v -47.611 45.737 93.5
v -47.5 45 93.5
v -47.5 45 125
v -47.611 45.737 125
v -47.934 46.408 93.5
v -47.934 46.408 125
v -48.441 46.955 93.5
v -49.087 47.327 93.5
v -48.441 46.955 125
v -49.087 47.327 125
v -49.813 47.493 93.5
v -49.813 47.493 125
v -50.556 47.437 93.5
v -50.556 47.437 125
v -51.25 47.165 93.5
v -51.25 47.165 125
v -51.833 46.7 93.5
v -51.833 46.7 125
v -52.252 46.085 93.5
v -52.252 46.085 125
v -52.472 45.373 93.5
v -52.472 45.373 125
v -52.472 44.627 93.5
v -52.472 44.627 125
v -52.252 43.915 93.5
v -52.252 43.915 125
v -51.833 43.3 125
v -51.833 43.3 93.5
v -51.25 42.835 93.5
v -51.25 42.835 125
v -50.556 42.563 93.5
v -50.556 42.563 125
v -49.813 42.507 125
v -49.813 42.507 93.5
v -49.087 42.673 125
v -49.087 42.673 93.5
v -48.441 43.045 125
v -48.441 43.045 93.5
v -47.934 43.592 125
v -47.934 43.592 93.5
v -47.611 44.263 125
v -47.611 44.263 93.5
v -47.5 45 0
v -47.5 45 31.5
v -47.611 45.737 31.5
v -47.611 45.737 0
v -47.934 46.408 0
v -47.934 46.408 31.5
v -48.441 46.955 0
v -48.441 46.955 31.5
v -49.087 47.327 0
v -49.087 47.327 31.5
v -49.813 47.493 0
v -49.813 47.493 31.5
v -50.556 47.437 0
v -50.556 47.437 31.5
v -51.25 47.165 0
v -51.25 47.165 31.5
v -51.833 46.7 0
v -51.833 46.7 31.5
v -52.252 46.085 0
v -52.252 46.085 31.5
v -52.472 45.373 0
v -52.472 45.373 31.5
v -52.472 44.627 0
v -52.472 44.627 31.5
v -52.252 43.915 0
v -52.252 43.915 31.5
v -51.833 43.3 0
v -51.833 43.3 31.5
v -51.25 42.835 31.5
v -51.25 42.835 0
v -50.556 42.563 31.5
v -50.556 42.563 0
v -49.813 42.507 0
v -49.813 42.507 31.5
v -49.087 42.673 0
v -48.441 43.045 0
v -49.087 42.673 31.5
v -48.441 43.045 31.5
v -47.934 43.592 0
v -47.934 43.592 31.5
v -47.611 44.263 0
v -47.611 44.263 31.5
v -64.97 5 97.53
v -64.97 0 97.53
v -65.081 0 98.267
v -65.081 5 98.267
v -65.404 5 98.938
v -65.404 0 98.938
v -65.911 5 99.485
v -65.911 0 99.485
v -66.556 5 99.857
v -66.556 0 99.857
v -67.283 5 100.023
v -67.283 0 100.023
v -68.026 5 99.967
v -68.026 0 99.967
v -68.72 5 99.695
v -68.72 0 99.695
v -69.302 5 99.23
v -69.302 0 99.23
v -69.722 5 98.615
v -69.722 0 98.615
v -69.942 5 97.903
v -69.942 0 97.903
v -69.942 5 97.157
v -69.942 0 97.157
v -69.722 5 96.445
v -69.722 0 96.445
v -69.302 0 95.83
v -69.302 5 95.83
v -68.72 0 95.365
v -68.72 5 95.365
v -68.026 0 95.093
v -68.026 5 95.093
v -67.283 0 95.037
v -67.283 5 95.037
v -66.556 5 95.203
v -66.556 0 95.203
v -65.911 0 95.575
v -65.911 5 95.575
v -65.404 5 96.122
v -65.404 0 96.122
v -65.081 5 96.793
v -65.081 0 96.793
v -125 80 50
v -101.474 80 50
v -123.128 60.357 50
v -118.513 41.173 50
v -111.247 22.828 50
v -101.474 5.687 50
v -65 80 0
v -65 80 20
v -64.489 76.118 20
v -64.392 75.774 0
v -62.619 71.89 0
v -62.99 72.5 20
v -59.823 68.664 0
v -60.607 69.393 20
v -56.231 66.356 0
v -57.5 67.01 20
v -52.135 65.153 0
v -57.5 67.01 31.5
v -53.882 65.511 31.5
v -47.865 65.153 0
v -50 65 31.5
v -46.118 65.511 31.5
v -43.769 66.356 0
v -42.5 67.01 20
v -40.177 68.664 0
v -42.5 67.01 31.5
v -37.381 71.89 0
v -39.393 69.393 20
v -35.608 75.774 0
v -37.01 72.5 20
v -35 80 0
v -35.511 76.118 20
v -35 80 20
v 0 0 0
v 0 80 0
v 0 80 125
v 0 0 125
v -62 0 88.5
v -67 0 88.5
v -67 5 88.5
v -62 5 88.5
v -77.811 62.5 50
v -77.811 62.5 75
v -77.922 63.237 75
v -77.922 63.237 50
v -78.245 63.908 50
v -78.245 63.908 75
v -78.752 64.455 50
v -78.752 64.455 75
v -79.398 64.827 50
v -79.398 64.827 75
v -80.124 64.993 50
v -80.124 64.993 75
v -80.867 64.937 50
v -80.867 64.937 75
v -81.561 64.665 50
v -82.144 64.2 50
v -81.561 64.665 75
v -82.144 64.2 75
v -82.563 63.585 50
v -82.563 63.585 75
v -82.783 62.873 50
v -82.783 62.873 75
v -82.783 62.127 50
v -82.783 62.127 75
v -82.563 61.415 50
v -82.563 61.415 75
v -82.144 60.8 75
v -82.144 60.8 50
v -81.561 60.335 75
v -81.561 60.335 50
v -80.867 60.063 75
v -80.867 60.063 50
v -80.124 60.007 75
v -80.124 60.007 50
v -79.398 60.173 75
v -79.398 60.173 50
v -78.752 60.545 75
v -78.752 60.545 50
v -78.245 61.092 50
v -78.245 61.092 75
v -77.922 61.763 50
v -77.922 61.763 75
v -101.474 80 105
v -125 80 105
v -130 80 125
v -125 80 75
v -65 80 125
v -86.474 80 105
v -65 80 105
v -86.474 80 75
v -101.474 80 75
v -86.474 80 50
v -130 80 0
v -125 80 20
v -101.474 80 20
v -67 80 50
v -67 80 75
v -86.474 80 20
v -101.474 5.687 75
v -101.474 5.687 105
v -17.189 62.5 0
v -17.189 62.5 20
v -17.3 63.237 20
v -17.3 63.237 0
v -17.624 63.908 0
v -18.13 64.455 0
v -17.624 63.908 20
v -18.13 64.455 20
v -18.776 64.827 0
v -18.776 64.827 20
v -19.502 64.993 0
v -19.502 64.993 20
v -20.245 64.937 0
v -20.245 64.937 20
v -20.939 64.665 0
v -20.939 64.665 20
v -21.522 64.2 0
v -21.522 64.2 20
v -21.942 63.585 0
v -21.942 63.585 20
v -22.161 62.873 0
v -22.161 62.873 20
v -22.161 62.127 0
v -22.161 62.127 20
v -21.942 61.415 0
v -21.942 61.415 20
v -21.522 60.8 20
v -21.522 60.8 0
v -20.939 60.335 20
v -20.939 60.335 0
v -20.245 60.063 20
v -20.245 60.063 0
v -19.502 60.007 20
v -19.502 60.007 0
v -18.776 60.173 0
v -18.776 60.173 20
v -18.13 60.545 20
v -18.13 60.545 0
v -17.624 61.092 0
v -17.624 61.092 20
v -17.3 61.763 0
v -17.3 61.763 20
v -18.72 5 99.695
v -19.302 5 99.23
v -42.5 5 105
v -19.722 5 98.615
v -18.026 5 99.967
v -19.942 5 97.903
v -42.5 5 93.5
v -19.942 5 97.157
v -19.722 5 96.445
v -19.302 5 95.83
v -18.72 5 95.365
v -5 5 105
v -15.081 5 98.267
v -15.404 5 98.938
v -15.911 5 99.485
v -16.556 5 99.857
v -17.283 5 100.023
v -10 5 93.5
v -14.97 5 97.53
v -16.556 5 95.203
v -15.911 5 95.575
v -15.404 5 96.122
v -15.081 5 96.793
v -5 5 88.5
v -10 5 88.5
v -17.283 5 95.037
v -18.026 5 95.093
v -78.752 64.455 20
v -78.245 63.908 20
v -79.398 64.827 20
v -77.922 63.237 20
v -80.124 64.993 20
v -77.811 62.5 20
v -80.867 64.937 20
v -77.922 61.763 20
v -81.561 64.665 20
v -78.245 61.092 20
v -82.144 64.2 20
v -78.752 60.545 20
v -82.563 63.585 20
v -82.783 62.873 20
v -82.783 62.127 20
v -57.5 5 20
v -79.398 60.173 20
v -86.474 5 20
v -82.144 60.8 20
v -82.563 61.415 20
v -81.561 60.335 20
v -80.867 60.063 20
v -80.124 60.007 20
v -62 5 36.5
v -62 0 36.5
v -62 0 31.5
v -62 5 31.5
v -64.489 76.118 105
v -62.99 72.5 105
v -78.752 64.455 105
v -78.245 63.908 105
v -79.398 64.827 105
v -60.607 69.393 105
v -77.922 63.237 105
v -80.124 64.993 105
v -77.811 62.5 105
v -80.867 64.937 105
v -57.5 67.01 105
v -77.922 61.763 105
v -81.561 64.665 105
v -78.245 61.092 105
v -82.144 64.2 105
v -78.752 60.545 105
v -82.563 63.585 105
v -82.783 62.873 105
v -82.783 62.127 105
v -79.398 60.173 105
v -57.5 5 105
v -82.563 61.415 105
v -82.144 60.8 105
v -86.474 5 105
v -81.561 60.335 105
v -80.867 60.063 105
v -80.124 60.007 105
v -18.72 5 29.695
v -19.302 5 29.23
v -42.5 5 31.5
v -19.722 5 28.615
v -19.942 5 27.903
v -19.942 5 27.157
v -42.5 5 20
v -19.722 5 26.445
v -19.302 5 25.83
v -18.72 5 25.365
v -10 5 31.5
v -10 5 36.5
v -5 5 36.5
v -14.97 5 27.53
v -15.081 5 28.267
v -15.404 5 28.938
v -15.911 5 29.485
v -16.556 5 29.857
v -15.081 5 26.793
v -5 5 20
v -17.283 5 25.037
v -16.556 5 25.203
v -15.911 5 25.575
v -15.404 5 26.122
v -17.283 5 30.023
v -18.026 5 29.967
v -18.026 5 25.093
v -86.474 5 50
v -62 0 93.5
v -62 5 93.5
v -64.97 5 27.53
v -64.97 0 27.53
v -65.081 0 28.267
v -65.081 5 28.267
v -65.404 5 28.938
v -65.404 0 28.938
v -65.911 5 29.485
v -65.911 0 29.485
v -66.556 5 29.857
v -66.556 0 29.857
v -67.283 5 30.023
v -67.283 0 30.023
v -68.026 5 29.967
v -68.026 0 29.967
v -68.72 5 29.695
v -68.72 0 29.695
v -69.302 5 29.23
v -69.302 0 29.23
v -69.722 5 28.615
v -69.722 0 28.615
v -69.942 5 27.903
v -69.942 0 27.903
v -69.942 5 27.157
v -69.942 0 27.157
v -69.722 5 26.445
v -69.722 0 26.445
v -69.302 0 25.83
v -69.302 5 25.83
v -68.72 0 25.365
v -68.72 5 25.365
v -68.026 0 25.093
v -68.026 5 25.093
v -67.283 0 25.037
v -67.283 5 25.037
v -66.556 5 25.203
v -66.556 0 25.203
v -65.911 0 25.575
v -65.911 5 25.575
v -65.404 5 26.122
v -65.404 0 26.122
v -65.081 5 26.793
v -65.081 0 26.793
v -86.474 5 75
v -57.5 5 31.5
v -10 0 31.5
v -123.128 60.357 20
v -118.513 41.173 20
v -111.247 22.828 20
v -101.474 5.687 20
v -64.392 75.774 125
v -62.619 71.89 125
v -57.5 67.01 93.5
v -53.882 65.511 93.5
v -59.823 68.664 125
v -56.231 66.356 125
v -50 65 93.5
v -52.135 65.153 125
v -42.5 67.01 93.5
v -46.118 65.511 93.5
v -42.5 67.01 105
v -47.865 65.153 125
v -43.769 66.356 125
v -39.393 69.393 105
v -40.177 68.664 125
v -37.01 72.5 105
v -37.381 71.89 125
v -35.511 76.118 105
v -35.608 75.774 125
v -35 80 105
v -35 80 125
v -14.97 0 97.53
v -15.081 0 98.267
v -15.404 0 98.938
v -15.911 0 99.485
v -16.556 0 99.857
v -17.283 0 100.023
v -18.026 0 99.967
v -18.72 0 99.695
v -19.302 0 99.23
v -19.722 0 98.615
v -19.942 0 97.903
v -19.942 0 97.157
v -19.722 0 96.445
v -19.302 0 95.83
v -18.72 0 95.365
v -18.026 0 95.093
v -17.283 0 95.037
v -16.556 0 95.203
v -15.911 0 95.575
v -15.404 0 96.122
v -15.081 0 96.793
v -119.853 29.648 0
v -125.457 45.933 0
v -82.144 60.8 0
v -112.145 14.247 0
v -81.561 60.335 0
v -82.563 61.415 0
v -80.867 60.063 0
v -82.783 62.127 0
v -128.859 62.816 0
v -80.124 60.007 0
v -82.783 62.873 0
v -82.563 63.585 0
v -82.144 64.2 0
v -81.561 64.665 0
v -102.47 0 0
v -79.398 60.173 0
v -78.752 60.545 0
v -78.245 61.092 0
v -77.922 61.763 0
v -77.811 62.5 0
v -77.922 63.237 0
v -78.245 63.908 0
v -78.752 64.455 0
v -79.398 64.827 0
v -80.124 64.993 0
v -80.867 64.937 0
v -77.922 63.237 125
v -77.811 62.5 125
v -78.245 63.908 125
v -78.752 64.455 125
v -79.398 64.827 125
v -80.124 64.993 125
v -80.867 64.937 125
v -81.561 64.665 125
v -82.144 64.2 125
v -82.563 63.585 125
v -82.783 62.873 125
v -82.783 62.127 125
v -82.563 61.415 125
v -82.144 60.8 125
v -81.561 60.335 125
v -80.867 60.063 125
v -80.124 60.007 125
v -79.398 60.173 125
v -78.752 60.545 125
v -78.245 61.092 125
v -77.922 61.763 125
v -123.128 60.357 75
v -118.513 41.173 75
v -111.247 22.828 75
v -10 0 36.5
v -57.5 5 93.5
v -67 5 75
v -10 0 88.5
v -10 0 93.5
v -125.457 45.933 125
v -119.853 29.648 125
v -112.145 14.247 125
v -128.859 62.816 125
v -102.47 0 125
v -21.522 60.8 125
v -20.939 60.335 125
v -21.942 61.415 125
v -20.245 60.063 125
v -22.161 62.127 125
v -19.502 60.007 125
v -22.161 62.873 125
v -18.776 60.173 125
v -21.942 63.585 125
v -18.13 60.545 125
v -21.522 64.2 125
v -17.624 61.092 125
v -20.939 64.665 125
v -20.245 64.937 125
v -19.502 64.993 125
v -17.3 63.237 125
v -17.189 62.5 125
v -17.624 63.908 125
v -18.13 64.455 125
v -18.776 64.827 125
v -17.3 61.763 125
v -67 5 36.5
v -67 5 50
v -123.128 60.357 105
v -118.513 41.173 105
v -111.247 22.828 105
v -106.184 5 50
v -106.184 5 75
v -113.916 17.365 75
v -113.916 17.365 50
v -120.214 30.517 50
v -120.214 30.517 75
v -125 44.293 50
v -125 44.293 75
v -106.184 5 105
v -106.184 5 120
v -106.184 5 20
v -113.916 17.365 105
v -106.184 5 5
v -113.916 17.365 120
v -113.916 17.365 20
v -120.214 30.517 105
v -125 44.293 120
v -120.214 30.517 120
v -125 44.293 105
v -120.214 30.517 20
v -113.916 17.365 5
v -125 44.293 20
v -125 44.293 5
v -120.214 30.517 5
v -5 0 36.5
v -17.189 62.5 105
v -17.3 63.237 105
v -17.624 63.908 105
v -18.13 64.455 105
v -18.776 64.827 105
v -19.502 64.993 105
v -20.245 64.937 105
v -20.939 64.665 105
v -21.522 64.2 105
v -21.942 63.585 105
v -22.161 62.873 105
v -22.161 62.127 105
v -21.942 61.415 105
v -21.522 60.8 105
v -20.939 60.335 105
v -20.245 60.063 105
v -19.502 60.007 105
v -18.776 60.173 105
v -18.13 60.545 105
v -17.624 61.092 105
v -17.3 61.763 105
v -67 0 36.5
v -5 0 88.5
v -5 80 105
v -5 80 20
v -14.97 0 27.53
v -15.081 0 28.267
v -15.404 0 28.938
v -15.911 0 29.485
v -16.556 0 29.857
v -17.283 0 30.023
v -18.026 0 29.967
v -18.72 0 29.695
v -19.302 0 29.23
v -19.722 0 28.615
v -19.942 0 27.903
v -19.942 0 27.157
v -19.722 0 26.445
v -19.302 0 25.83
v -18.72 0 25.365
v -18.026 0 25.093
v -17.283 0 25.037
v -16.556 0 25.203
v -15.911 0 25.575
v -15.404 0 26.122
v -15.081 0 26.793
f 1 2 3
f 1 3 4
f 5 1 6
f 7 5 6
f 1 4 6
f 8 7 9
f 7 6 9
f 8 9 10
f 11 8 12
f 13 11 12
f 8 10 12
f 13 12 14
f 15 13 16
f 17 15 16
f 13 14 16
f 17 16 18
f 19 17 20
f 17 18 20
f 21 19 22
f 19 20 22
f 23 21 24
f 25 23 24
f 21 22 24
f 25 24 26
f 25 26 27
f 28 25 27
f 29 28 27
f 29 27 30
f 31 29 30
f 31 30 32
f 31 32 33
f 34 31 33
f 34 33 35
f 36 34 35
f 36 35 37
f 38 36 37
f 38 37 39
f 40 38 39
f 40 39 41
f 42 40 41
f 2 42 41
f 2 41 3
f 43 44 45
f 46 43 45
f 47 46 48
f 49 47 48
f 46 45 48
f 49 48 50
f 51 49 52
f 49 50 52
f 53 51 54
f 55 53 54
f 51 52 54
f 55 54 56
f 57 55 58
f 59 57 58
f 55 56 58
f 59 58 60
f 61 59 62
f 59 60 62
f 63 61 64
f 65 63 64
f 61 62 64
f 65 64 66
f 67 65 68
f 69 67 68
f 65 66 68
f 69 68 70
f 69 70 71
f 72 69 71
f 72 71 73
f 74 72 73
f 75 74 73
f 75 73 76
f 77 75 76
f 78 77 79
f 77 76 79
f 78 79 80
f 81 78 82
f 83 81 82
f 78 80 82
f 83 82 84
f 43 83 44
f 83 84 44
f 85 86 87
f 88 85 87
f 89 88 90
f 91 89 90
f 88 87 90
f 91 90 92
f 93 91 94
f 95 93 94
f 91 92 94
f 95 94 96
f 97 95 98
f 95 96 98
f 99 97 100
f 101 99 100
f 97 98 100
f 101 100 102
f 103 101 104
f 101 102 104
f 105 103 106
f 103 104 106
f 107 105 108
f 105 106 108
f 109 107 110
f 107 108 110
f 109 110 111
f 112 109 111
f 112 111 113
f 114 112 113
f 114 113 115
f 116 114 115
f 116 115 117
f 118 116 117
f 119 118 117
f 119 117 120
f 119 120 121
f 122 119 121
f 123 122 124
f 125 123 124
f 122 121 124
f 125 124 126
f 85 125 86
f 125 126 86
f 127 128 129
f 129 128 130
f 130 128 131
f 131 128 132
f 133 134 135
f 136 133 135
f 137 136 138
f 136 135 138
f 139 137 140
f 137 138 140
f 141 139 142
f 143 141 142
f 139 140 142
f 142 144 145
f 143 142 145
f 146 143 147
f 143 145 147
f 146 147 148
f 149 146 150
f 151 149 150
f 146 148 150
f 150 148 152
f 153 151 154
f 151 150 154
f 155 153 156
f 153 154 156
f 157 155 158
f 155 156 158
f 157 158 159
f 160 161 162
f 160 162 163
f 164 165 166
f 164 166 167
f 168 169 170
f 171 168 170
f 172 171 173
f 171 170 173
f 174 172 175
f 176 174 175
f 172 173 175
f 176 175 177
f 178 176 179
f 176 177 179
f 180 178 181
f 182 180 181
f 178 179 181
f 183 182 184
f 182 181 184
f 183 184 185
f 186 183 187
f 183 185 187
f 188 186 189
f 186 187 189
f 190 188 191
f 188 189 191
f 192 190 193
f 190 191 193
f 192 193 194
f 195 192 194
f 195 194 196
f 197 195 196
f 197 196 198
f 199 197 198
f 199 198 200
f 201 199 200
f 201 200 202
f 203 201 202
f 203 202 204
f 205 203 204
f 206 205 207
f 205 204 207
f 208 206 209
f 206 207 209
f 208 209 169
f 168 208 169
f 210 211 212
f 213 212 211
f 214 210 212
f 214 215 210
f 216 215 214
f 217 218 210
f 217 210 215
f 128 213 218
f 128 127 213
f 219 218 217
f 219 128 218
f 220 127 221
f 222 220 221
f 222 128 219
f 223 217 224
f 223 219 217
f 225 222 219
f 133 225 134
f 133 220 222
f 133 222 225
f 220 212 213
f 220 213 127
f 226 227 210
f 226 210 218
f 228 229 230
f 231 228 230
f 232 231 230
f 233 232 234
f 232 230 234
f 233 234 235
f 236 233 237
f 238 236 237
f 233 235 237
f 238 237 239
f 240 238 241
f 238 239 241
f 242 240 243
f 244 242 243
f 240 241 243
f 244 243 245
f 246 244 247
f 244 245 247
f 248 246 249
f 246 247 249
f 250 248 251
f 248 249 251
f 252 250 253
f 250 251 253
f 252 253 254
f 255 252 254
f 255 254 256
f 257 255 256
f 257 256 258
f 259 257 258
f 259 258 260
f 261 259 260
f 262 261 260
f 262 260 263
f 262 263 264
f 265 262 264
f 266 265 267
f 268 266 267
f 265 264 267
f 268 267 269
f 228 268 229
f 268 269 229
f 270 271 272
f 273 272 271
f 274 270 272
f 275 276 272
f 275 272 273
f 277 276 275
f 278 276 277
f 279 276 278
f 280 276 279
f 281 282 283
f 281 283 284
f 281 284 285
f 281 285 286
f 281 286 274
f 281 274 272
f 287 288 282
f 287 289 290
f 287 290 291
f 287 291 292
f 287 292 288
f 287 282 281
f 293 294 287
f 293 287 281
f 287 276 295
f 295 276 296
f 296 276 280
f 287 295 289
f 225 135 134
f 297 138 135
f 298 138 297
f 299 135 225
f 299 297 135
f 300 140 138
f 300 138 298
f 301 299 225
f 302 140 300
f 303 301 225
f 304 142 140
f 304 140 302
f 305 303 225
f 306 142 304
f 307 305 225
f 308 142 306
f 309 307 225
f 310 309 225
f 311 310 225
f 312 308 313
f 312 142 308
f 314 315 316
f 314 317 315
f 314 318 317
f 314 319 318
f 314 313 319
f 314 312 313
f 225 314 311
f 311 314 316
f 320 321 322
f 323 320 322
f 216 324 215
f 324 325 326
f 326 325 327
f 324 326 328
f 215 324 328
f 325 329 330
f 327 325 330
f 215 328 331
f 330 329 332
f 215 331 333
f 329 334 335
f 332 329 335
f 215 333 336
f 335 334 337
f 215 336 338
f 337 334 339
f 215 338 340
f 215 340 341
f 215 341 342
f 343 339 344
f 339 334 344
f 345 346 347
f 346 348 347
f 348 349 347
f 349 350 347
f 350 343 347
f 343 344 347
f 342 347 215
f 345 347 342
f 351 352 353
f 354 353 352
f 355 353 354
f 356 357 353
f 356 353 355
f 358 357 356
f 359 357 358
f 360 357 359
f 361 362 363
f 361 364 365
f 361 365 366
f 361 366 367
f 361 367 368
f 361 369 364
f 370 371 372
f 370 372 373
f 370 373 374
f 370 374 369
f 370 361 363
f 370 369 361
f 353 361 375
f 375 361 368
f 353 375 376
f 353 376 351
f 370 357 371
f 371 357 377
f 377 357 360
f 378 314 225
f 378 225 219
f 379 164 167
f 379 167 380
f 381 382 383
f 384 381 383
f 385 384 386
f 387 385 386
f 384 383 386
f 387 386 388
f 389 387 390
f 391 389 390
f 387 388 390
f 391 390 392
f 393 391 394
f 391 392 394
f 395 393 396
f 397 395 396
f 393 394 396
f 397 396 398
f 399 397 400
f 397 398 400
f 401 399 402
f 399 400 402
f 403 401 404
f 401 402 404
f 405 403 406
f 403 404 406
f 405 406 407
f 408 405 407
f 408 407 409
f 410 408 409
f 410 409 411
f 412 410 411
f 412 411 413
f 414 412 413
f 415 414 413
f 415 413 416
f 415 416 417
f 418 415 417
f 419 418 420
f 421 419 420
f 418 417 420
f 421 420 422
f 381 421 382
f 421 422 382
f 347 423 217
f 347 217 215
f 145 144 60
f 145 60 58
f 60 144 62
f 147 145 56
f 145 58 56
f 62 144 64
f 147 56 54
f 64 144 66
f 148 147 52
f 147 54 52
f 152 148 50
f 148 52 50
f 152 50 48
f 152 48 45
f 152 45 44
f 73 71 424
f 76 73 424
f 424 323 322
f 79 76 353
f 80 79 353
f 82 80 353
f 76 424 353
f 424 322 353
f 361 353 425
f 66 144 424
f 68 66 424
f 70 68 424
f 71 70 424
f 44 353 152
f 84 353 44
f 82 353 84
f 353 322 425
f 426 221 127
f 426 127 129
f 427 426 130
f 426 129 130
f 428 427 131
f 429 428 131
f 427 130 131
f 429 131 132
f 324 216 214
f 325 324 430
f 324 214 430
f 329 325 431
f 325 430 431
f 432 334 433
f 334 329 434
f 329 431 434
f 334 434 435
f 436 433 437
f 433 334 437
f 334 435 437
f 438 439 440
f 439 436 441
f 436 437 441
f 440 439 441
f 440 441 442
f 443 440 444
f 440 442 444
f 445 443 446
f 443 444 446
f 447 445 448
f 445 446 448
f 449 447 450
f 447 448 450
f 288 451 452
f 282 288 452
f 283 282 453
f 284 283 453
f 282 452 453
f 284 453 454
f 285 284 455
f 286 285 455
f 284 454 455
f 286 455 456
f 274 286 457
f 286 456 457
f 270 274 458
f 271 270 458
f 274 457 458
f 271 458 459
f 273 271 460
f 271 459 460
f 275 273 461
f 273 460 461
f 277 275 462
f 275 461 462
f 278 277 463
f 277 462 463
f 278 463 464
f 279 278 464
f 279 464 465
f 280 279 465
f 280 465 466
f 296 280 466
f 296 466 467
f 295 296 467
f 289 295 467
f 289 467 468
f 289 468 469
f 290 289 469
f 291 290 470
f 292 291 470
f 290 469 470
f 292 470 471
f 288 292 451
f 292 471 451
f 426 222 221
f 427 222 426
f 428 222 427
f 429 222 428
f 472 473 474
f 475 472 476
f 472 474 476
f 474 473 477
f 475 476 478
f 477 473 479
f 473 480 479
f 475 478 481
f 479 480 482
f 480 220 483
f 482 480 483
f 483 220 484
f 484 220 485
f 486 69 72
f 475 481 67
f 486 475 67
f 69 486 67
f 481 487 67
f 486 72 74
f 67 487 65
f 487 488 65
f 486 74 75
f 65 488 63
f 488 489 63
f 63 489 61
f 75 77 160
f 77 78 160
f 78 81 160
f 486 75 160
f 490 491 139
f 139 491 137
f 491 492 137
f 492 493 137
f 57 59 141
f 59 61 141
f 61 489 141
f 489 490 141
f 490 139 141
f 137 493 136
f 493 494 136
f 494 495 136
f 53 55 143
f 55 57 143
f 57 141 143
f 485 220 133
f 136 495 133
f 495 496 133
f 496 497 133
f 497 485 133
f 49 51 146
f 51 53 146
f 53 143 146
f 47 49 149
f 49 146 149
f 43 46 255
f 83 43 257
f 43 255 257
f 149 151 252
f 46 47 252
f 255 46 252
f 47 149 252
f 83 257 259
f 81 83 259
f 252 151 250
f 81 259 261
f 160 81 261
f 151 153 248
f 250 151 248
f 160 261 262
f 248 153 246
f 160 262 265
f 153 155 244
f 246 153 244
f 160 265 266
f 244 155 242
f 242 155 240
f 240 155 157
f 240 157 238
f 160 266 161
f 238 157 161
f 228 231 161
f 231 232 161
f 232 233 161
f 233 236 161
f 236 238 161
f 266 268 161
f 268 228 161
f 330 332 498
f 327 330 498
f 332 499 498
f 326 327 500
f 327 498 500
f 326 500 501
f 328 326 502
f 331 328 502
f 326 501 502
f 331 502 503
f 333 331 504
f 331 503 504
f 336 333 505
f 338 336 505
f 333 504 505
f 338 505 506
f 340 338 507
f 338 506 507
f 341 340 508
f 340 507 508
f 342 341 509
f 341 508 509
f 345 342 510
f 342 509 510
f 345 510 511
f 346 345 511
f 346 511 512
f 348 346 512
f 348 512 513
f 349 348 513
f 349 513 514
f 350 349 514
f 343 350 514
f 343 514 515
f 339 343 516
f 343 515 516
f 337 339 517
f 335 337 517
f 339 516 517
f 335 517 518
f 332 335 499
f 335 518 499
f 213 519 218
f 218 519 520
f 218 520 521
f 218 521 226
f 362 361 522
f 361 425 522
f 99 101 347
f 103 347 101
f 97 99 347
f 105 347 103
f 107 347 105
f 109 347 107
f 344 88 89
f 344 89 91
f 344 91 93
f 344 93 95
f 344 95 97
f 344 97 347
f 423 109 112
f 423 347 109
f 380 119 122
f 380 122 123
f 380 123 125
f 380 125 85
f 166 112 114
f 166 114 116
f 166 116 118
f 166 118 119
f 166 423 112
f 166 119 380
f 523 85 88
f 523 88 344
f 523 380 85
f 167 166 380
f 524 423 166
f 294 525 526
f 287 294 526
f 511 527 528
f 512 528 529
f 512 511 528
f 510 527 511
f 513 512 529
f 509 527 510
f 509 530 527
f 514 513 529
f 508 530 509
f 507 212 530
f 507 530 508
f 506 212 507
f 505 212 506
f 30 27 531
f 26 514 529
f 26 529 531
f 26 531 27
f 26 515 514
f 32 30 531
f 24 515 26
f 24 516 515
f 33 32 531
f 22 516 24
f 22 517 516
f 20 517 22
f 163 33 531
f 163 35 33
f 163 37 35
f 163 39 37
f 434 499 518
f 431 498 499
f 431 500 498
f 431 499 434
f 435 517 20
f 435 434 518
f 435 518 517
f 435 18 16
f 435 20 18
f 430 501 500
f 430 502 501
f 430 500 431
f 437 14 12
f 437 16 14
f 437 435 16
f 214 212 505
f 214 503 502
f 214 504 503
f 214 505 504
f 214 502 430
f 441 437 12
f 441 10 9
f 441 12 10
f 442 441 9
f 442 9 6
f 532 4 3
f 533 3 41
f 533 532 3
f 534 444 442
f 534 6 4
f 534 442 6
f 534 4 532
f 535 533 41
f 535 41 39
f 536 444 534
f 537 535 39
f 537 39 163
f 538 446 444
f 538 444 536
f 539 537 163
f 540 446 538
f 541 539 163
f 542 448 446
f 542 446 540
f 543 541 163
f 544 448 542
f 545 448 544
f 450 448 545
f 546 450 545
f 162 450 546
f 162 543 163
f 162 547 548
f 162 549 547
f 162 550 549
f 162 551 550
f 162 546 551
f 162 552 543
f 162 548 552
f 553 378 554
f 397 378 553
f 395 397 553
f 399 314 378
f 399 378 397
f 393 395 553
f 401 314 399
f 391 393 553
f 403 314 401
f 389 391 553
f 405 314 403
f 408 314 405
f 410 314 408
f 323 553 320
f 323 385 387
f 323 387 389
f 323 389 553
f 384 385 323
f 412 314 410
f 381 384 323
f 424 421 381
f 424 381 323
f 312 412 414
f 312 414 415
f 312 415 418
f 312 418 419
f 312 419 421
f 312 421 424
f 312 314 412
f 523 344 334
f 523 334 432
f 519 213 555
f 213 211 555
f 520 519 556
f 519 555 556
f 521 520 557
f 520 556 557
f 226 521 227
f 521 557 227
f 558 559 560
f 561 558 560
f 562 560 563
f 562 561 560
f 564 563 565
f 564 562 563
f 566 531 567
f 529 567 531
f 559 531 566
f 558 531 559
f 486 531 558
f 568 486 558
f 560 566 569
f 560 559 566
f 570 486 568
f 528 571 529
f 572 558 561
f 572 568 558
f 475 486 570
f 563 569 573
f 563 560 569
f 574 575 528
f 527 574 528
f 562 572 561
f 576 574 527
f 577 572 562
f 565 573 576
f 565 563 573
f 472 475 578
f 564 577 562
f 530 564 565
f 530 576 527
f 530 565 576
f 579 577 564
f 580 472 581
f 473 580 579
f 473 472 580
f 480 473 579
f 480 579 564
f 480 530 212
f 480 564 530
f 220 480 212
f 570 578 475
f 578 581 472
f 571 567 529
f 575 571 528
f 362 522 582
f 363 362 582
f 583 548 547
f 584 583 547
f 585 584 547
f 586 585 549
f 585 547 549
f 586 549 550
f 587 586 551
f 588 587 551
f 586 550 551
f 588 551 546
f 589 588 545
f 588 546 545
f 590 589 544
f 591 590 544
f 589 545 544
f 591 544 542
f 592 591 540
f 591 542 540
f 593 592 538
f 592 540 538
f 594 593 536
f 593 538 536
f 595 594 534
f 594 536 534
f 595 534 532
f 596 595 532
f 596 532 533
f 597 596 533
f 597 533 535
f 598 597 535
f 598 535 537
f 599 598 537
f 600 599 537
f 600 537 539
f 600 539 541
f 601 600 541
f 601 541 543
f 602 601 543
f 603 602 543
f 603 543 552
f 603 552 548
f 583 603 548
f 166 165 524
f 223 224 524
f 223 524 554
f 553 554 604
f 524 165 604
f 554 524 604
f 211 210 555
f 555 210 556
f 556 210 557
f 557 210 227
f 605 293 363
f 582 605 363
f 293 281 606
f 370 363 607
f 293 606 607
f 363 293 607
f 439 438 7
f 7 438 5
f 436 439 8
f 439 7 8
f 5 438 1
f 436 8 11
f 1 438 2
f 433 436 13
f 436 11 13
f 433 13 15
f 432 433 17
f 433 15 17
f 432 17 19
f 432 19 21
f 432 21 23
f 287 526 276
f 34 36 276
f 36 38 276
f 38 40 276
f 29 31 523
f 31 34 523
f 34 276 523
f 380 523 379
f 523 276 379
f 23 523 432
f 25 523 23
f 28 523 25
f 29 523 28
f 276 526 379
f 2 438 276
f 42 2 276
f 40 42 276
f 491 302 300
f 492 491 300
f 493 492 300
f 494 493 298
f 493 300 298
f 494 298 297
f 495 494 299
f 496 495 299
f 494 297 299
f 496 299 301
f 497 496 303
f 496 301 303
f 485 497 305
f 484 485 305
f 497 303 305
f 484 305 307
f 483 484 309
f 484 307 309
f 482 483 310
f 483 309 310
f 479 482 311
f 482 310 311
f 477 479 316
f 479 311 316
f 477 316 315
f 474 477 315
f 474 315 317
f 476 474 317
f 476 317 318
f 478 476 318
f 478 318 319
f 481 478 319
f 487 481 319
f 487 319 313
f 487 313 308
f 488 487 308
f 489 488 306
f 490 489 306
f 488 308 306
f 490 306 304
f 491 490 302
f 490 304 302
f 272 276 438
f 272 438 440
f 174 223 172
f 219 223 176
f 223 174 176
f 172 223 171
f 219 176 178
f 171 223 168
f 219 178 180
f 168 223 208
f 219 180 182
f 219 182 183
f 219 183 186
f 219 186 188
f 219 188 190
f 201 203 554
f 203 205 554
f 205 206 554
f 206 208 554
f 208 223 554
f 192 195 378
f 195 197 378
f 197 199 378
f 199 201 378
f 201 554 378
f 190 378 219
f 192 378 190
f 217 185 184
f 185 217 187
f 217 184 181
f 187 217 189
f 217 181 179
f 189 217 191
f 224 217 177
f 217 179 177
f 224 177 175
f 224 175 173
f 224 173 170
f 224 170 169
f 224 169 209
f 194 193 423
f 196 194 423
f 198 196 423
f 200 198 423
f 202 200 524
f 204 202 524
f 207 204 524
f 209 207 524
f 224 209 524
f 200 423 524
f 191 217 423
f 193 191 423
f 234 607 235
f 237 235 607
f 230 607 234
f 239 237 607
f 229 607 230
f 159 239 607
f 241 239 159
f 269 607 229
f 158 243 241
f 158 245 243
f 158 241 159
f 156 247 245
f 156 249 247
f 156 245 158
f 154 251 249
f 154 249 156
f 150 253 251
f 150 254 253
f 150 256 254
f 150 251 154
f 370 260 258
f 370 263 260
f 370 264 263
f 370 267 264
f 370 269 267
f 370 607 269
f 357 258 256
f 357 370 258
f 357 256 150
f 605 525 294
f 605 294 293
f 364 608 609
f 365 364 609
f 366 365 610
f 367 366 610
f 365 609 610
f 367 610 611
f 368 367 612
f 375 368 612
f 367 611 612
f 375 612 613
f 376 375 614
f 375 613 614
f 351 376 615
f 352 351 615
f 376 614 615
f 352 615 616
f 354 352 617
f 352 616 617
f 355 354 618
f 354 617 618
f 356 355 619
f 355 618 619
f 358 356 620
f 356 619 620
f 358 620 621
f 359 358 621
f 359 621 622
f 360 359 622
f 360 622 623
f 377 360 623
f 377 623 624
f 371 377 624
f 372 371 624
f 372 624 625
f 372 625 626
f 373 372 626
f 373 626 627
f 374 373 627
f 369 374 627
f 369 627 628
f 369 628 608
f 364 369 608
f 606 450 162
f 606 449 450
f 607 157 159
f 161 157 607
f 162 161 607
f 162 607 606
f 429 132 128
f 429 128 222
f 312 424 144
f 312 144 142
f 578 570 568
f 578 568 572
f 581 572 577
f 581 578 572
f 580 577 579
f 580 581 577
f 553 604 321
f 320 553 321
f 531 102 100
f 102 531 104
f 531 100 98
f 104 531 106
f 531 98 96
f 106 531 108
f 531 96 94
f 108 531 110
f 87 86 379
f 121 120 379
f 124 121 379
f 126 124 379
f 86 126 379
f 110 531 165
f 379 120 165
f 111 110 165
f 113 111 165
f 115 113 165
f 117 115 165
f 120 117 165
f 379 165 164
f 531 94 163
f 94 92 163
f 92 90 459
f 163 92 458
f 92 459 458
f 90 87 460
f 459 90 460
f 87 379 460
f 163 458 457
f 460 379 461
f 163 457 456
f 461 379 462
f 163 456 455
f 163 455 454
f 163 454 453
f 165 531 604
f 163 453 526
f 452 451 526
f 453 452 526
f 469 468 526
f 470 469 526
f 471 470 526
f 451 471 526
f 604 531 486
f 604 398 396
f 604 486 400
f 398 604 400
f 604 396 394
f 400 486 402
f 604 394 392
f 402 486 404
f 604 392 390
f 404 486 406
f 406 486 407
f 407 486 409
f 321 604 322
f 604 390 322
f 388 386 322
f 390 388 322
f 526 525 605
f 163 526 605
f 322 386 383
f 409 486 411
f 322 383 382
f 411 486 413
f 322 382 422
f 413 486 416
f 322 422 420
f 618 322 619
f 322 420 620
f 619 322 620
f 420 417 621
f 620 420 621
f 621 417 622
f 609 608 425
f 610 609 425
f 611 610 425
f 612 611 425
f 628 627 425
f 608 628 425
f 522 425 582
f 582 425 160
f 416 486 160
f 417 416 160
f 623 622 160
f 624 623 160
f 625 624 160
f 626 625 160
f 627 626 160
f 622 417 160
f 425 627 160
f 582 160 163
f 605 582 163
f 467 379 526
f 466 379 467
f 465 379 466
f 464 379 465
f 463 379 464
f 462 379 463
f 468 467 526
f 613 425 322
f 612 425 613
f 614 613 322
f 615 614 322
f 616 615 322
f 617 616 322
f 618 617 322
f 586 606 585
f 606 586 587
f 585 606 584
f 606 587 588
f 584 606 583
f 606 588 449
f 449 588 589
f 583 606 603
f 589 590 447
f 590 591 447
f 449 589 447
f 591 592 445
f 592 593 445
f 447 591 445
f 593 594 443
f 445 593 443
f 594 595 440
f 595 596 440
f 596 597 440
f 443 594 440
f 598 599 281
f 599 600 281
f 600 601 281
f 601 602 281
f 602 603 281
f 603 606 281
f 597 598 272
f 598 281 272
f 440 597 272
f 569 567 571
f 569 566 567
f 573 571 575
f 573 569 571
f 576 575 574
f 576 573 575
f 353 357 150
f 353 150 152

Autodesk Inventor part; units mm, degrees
ref_plane "YZ Plane" through (0, 0, 0) normal (1, 0, 0) x (0, 1, 0)
ref_plane "XZ Plane" through (0, 0, 0) normal (0, 1, 0) x (-1, 0, 0)
ref_plane "XY Plane" through (0, 0, 0) normal (0, 0, 1) x (1, 0, 0)
sketch "Sketch1" plane through (0, 0, 0) normal (0, 0, 1) x (1, 0, 0)
  circle A0 centre (0, 80) radius 130 construction
  line L0 (0, -50) -> (0, 0) construction
  line L1 (0, 0) -> (-102.4695, 0) construction
  arc A1 (-130, 80) -> (-102.4695, 0) centre (0, 80) ccw
  line L2 (-130, 80) -> (0, 80)
  line L3 (0, 80) -> (0, 0)
  line L4 (-102.4695, 0) -> (0, 0)
  dimension "d0" = 260
  dimension "d1" = 50
extrude "Extrusion1" add sketch "Sketch1" along normal blind 125
sketch "Sketch6" plane through (-130, 80, 0) normal (0, 1, 0) x (1, 0, 0)
  line L0 (0, 0) -> (0, -125) projected
  line L1 (0, 0) -> (130, 0)
  line L2 (130, 0) -> (130, -125)
  line L3 (130, -125) -> (0, -125)
  line L4 (0, -125) -> (0, 0)
  line L5 (5, -120) -> (125, -120)
  line L6 (125, -120) -> (125, -5)
  line L7 (125, -5) -> (5, -5)
  line L8 (5, -5) -> (5, -120)
  point P0 (130, 0)
  dimension "d25" = 5
extrude "Extrusion5" cut sketch "Sketch6" against normal blind 75 contours L8 L7 L6 L5
sketch "Sketch7" plane through (-102.4695, 0, 0) normal (0, -1, 0) x (1, 0, 0)
  circle A0 centre (35, 97.53) radius 2.5
  circle A1 centre (85, 97.53) radius 2.5
  line L0 (0, 125) -> (102.4695, 125) projected
  line L1 (0, 0) -> (0, 125) projected
  circle A2 centre (35, 27.53) radius 2.5
  circle A3 centre (85, 27.53) radius 2.5
  line L2 (102.4695, 0) -> (102.4695, 125) projected
  dimension "d28" = 5
  dimension "d29" = 5
  dimension "d30" = 27.47
  dimension "d31" = 50
  dimension "d33" = 5
  dimension "d34" = 5
  dimension "d35" = 70
  dimension "d82" = 35
extrude "Extrusion6" cut sketch "Sketch7" against normal through all
sketch "Sketch8" plane through (0, 0, 125) normal (0, 0, 1) x (1, 0, 0)
  line L0 (0, 80) -> (-130, 80) projected
  arc A0 (-130, 80) -> (-102.4695, 0) centre (0, 80) ccw projected
  arc A1 (-130, 80) -> (-102.4695, 0) centre (9.9581, 83.4269) ccw
  line L1 (-102.4695, 0) -> (-97.4695, 0)
  line L2 (-102.4695, 0) -> (0, 0) projected
  line L3 (-130, 80) -> (-125, 80)
  arc A2 (-125, 80) -> (-97.4695, 0) centre (14.9581, 83.4269) ccw
  dimension "d40" = 5
  dimension "d41" = 5
  dimension "d42" = 140
extrude "Extrusion7" add sketch "Sketch8" against normal blind 125
sketch "Sketch11" plane through (-130, 5, 0) normal (0, 1, 0) x (1, 0, 0)
  line L0 (125, -5) -> (125, -120) projected
  line L1 (125, -50) -> (5, -50)
  line L2 (5, -50) -> (5, -65)
  line L3 (5, -65) -> (125, -65)
  line L4 (125, -65) -> (125, -50)
  line L5 (125, -60) -> (5, -60)
  line L6 (5, -60) -> (5, -75)
  line L7 (5, -75) -> (125, -75)
  line L8 (125, -75) -> (125, -60)
  line L9 (32.7619, 0) -> (32.7619, -150)
  line L10 (125, -105) -> (5, -105)
  line L11 (5, -105) -> (5, -120)
  line L12 (5, -120) -> (125, -120)
  line L13 (125, -120) -> (125, -105)
  line L14 (125, -20) -> (5, -20)
  line L15 (5, -20) -> (5, -5)
  line L16 (5, -5) -> (125, -5)
  line L17 (125, -5) -> (125, -20)
  line L18 (5, -5) -> (125, -5)
  line L19 (5, -120) -> (5, -5) projected
  line L20 (125, -120) -> (5, -120) projected
  line L21 (125, -5) -> (125, -20)
  point P0 (130, 0)
  point P1 (65, -120)
  point P2 (65, -5)
  point P3 (5, -12.5)
  point P4 (5, -57.5)
  dimension "d54" = 15
  dimension "d55" = 15
  dimension "d56" = 15
  dimension "d57" = 15
  dimension "d58" = 30
  dimension "d59" = 30
  dimension "d66" = 5
extrude "Extrusion10" add sketch "Sketch11" along normal blind 75 contours L0 L14 L9 L16 | L9 L14 L15 L16 | L0 L5 L9 L1 | L0 L3 L9 L5 | L9 L5 L2 L1 | L0 L7 L9 L3 | L9 L3 L2 L5 | L9 L7 L6 L3 | L0 L12 L9 L10 | L9 L12 L11 L10
sketch "Sketch12" plane through (-130, 5, 0) normal (0, 1, 0) x (1, 0, 0)
  line L0 (27.5305, 0) -> (130, 0) projected
  line L1 (27.5305, -125) -> (130, -125) projected
  line L2 (72.5, 0) -> (87.5, 0)
  line L3 (87.5, 0) -> (87.5, -125)
  line L4 (87.5, -125) -> (72.5, -125)
  line L5 (72.5, -125) -> (72.5, 0)
  line L6 (28.5256, 0) -> (43.5256, 0)
  line L7 (43.5256, 0) -> (43.5256, -125)
  line L8 (43.5256, -125) -> (28.5256, -125)
  line L9 (28.5256, -125) -> (28.5256, 0)
  line L10 (130, 0) -> (130, -125) projected
  dimension "d62" = 15
  dimension "d63" = 15
  dimension "d92" = 42.5
extrude "Extrusion11" add sketch "Sketch12" along normal blind 75 contours L0 L7 L1 L9 | L0 L3 L1 L5
sketch "Sketch9" plane through (0, 0, 125) normal (0, 0, 1) x (1, 0, 0)
  circle A0 centre (-50, 80) radius 15
  point P0 (0, 0)
  point P1 (0, 80)
  dimension "d45" = 30
  dimension "d46" = 50
extrude "Extrusion8" cut sketch "Sketch9" against normal through all
sketch "Sketch13" plane through (0, 0, 0) normal (0, 0, -1) x (-1, 0, 0)
  arc A0 (102.4695, 0) -> (130, 80) centre (-9.9581, 83.4269) ccw
  line L0 (130, 80) -> (130, 80)
  arc A1 (102.4695, 0) -> (130, 80) centre (0, 80) ccw projected
  line L1 (130, 80) -> (130, 80)
  line L2 (65, 80) -> (130, 80) projected
  line L3 (130, 80) -> (130, 0)
  line L4 (130, 0) -> (102.4695, 0)
  point P0 (0, 0)
  dimension "d67" = 140
extrude "Extrusion12" cut sketch "Sketch13" against normal through all contours A1 L3 L4
sketch "Sketch14" plane through (0, 0, 125) normal (0, 0, 1) x (1, 0, 0)
  line L0 (-102.4695, 0) -> (0, 0) construction
  line L1 (-50, 0) -> (-50, 196.0469) construction
  line L2 (0, 80) -> (-93.0222, 80) construction
  line L3 (-50, 80) -> (28.9192, 80) construction
  circle A0 centre (-50, 115) radius 2.5
  circle A1 centre (-50, 80) radius 35 construction
  circle A2 centre (-80.3109, 97.5) radius 2.5
  circle A3 centre (-80.3109, 62.5) radius 2.5
  circle A4 centre (-50, 45) radius 2.5
  circle A5 centre (-19.6891, 62.5) radius 2.5
  circle A6 centre (-19.6891, 97.5) radius 2.5
  dimension "d74" = 70
  dimension "d70" = 50
  dimension "d72" = 5
  dimension "d77" = 360
extrude "Extrusion13" cut sketch "Sketch14" against normal through all contours A3 | A4 | A5
sketch "Sketch16" plane through (-102.4695, 0, 0) normal (0, -1, 0) x (1, 0, 0)
  line L0 (35.4695, 31.5) -> (35.4695, 93.5) construction
  line L1 (97.4695, 93.5) -> (35.4695, 93.5) construction
  line L2 (35.4695, 93.5) -> (35.4695, 31.5) construction
  line L3 (35.4695, 31.5) -> (97.4695, 31.5) construction
  line L4 (97.4695, 31.5) -> (97.4695, 93.5) construction
  line L5 (0, 125) -> (102.4695, 125) projected
  line L6 (0, 0) -> (102.4695, 0) projected
  line L7 (102.4695, 0) -> (102.4695, 125) projected
  line L8 (97.4695, 93.5) -> (92.4695, 93.5) construction
  line L9 (92.4695, 93.5) -> (92.4695, 88.5) construction
  line L10 (92.4695, 88.5) -> (97.4695, 88.5) construction
  line L11 (97.4695, 88.5) -> (97.4695, 93.5) construction
  line L12 (35.4695, 31.5) -> (40.4695, 31.5) construction
  line L13 (40.4695, 31.5) -> (40.4695, 36.5) construction
  line L14 (40.4695, 36.5) -> (35.4695, 36.5) construction
  line L15 (35.4695, 36.5) -> (35.4695, 31.5) construction
  line L16 (35.4695, 93.5) -> (40.4695, 93.5) construction
  line L17 (40.4695, 93.5) -> (40.4695, 88.5) construction
  line L18 (40.4695, 88.5) -> (35.4695, 88.5) construction
  line L19 (35.4695, 88.5) -> (35.4695, 93.5) construction
  line L20 (97.4695, 31.5) -> (92.4695, 31.5) construction
  line L21 (92.4695, 31.5) -> (92.4695, 36.5) construction
  line L22 (92.4695, 36.5) -> (97.4695, 36.5) construction
  line L23 (97.4695, 36.5) -> (97.4695, 31.5) construction
  line L24 (92.4695, 93.5) -> (40.4695, 93.5)
  line L25 (40.4695, 88.5) -> (40.4695, 93.5)
  line L26 (35.4695, 88.5) -> (40.4695, 88.5)
  line L27 (35.4695, 88.5) -> (35.4695, 36.5)
  line L28 (35.4695, 36.5) -> (40.4695, 36.5)
  line L29 (40.4695, 36.5) -> (40.4695, 31.5)
  line L30 (40.4695, 31.5) -> (92.4695, 31.5)
  line L31 (92.4695, 31.5) -> (92.4695, 36.5)
  line L32 (92.4695, 36.5) -> (97.4695, 36.5)
  line L33 (97.4695, 20) -> (97.4695, 50) projected
  line L34 (97.4695, 36.5) -> (97.4695, 88.5)
  line L35 (97.4695, 75) -> (97.4695, 105) projected
  line L36 (92.4695, 88.5) -> (97.4695, 88.5)
  line L37 (92.4695, 88.5) -> (92.4695, 93.5)
  point P0 (97.4695, 62.5)
  point P1 (102.4695, 62.5)
  point P2 (66.4695, 31.5)
  point P3 (51.2348, 0)
  dimension "d100" = 62
  dimension "d101" = 62
  dimension "d102" = 5
  dimension "d103" = 5
  dimension "d104" = 5
  dimension "d105" = 5
  dimension "d106" = 5
  dimension "d107" = 5
  dimension "d108" = 5
  dimension "d109" = 5
  dimension "d110" = 5
extrude "Extrusion15" cut sketch "Sketch16" against normal through all
equation "\"d101\" = d100"
properties part number "SJ005" material "ABS Plastic"
